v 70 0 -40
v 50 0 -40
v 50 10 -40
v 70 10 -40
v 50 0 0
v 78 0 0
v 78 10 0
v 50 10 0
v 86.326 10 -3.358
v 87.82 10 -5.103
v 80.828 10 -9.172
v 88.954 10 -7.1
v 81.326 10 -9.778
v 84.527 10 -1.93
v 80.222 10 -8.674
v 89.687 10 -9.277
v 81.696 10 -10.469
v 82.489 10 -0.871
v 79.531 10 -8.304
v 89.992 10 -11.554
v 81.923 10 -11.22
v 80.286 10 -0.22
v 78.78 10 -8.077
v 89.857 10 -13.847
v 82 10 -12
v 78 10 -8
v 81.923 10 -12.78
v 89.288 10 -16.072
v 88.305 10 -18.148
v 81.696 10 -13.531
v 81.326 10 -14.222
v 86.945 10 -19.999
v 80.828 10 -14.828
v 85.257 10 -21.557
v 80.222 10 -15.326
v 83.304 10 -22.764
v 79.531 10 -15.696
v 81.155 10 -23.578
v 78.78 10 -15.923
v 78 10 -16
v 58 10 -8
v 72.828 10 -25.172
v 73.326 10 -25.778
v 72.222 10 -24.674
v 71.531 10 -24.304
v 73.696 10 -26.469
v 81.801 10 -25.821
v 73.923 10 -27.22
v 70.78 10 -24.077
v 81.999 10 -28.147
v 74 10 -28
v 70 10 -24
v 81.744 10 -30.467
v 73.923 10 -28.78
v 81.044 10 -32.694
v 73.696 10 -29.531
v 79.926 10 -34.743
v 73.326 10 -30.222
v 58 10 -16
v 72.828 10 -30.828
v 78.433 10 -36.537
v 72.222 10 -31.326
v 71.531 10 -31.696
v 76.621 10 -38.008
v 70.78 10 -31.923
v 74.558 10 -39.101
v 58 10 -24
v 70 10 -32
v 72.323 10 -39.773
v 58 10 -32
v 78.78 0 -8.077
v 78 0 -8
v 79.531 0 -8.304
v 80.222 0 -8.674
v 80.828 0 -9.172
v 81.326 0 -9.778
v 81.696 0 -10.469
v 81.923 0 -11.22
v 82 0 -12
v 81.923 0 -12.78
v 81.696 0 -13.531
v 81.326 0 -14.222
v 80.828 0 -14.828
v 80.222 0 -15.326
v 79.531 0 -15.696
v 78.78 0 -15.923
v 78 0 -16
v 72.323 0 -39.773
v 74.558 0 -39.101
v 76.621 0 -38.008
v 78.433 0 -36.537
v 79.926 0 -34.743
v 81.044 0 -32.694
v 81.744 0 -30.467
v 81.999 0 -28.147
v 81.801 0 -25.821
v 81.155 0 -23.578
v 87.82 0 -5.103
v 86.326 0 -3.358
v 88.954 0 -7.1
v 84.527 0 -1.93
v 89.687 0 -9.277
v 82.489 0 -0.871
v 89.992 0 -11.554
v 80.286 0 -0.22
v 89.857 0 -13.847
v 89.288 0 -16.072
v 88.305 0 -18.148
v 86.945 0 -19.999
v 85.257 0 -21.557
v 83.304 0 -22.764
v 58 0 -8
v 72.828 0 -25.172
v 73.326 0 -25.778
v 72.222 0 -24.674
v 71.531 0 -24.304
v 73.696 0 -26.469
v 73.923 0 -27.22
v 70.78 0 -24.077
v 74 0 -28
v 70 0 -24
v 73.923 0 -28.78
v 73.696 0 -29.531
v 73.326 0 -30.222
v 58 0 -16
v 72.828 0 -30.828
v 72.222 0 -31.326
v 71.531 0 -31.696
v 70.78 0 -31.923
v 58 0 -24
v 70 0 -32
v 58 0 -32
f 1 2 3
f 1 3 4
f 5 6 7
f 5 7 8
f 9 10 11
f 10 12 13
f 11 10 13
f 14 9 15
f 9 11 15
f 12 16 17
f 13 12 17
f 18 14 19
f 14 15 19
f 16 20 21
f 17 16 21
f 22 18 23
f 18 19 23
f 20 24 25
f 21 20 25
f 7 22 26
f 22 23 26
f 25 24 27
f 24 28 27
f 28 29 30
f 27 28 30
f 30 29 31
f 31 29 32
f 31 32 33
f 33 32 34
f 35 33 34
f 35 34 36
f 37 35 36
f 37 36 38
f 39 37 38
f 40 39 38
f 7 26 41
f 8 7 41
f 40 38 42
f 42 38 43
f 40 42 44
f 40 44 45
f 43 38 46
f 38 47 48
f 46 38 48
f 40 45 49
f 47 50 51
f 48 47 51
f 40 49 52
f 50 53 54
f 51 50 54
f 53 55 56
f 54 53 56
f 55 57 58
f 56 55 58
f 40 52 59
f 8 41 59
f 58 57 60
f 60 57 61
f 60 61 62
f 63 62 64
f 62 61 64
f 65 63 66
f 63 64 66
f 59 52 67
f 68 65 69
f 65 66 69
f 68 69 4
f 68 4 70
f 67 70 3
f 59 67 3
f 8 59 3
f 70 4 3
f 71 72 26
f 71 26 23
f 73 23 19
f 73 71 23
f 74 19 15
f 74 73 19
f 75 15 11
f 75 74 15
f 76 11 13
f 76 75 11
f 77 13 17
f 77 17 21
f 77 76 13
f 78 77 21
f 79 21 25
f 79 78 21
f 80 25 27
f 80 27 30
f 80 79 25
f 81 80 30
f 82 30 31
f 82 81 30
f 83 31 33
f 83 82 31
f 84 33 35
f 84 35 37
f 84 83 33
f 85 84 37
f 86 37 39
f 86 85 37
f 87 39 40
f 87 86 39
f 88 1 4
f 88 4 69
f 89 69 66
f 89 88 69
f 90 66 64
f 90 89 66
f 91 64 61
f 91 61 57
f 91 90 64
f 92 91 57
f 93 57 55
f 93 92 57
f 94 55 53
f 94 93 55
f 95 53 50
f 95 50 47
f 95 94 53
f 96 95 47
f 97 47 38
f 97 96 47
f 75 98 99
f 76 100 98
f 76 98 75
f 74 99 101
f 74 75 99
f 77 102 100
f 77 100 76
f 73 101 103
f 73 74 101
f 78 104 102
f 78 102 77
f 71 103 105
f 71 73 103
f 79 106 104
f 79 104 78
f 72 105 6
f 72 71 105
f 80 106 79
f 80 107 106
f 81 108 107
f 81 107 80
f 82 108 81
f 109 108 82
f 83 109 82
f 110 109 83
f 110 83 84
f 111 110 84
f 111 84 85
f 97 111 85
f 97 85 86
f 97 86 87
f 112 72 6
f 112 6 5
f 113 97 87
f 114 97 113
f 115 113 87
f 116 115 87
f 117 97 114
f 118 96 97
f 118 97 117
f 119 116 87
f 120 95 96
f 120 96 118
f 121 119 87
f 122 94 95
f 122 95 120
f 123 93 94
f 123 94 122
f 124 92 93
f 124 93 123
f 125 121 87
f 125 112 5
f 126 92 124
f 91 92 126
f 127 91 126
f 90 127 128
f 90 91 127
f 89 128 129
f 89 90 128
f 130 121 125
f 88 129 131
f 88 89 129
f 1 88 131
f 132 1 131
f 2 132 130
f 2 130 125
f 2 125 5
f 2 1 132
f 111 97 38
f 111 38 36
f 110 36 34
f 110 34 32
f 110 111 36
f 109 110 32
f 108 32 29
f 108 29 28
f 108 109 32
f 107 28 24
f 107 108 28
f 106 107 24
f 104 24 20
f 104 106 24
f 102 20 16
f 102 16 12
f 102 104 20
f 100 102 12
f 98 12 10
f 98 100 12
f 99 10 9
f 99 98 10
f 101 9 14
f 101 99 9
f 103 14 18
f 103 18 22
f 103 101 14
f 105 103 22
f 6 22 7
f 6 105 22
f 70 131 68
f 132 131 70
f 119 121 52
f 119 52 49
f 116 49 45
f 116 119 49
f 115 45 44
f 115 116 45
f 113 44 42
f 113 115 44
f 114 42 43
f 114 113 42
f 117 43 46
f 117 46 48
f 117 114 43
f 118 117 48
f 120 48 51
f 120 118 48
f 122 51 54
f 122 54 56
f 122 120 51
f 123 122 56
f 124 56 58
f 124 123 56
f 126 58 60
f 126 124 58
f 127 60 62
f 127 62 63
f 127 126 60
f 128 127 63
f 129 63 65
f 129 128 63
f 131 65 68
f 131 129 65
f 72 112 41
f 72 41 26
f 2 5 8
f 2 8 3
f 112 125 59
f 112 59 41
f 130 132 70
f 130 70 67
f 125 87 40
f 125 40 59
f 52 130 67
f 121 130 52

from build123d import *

# Parameters (mm, degrees)
BOSS_EXTRUDE1_DEPTH = 10


with BuildPart() as part:
    # Sketch1 → Boss-Extrude1 (new body)
    with BuildSketch(Plane(origin=(0, 0, 0), x_dir=(1, 0, 0), z_dir=(0, 1, 0))):
        with BuildLine():
            Line((50, 0), (50, 40))
            Line((50, 40), (70, 40))
            ThreePointArc((70, 40), (79.926416645, 34.742866793), (81.155417528, 23.577708764))
            ThreePointArc((81.155417528, 23.577708764), (89.893958659, 10.408225074), (78, 0))
            Line((78, 0), (50, 0))
        make_face()
        with BuildLine():
            Line((58, 32), (58, 24))
            Line((58, 24), (70, 24))
            ThreePointArc((70, 24), (74, 28), (70, 32))
            Line((70, 32), (58, 32))
        make_face(mode=Mode.SUBTRACT)
        with BuildLine():
            Line((58, 8), (78, 8))
            ThreePointArc((78, 8), (82, 12), (78, 16))
            Line((78, 16), (58, 16))
            Line((58, 16), (58, 8))
        make_face(mode=Mode.SUBTRACT)
    extrude(amount=BOSS_EXTRUDE1_DEPTH)


solid = part.part
